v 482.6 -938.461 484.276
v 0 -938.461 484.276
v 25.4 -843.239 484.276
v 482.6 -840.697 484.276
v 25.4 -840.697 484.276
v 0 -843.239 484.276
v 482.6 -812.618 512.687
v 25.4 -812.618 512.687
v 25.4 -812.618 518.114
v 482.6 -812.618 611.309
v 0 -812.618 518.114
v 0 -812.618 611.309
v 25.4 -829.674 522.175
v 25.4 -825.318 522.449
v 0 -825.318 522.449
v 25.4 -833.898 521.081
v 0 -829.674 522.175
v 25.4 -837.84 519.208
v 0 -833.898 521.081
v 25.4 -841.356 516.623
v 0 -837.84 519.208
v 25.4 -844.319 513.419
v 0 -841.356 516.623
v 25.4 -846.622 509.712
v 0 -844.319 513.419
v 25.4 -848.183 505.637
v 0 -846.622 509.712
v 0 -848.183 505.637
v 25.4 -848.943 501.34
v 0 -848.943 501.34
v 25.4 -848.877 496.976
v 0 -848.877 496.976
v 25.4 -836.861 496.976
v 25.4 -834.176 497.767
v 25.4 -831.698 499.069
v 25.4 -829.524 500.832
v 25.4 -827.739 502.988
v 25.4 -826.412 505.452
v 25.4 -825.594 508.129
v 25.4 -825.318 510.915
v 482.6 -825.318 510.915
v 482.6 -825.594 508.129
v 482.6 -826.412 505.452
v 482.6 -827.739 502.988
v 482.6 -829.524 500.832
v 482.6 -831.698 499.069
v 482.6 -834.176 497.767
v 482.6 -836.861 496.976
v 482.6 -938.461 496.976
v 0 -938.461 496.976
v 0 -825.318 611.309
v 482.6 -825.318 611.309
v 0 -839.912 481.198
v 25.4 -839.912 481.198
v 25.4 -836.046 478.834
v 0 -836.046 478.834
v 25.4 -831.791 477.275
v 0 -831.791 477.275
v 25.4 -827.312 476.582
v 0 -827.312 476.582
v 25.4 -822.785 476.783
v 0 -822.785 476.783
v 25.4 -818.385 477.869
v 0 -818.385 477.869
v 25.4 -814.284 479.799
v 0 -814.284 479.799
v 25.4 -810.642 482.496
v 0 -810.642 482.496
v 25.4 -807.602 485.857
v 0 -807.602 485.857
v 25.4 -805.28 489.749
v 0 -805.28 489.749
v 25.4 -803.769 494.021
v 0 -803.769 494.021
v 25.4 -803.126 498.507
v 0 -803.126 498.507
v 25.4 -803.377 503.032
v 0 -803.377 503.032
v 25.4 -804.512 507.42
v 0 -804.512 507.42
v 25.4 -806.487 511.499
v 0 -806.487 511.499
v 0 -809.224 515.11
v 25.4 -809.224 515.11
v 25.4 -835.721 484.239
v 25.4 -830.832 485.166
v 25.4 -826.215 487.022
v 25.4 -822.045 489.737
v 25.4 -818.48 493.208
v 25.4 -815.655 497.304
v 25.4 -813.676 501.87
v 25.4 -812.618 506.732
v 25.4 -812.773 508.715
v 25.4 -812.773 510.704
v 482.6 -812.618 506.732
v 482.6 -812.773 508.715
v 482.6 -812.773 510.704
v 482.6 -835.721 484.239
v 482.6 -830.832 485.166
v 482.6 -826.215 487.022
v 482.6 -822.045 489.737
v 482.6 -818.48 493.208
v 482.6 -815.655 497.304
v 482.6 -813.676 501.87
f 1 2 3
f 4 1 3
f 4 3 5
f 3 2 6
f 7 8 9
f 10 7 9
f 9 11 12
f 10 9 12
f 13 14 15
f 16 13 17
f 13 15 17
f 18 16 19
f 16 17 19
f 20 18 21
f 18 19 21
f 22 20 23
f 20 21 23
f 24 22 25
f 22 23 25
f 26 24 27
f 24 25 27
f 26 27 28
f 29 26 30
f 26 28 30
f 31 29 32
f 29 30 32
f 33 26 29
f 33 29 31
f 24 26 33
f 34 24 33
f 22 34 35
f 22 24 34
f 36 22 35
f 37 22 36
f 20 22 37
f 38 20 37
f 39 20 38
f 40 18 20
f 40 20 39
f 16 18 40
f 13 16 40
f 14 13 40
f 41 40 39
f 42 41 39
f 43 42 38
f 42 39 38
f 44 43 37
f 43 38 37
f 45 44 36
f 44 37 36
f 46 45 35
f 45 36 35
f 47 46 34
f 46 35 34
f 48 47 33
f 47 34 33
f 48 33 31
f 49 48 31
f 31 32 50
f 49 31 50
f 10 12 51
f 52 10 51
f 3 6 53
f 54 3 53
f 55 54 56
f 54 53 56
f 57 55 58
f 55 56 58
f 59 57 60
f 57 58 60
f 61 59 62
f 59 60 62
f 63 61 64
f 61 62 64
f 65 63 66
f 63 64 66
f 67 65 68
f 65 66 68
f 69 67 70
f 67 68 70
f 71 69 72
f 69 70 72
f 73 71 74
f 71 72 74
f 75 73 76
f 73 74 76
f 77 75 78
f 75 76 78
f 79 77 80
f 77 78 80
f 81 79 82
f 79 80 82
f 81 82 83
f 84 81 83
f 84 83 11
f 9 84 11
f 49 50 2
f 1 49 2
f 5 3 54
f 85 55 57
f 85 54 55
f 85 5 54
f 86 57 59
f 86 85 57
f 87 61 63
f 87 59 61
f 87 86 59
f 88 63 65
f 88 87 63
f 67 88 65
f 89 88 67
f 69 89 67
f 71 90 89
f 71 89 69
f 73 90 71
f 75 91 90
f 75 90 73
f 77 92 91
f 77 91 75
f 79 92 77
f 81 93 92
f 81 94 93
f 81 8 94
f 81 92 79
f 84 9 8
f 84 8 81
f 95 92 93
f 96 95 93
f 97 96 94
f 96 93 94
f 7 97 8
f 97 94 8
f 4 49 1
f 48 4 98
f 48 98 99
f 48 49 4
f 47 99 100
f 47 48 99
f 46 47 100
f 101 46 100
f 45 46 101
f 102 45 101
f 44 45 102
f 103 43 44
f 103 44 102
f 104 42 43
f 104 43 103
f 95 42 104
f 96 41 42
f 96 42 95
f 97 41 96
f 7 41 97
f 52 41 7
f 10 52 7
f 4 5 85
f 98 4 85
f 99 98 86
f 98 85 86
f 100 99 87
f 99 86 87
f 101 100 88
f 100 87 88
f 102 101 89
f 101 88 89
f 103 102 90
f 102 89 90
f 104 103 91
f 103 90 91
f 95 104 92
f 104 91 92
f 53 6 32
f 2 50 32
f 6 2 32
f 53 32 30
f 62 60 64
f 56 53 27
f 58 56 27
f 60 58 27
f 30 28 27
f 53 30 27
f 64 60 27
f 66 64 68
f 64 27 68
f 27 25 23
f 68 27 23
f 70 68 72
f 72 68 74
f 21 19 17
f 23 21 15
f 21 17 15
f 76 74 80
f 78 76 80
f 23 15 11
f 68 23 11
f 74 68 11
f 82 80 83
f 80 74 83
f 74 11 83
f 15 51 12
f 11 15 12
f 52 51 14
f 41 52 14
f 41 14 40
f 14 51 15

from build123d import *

# Parameters (mm, degrees)
F1_DEPTH = 482.6
F2_R     = 22.9562722026
F3_DEPTH = 25.4


# Not quite as in the source:
# - a feature names something its author has since deleted; it is built from what else it names


with BuildPart() as f1:
    # F0 (on Right) → F1 (new body)
    with BuildSketch(Plane.YZ):
        with BuildLine():
            Line((-812.6182556152, 512.6869344869), (-812.6182556152, 611.3093582153))
            Line((-812.6182556152, 611.3093582153), (-825.3182556152, 611.3093582153))
            Line((-825.3182556152, 611.3093582153), (-825.3182556152, 510.914683342))
            ThreePointArc((-825.3182556152, 510.914683342), (-828.5785642638, 501.8659167533), (-836.8610188459, 496.9760562897))
            Line((-836.8610188459, 496.9760562897), (-938.4610188459, 496.9760562897))
            Line((-938.4610188459, 496.9760562897), (-938.4610188459, 484.2760562897))
            Line((-938.4610188459, 484.2760562897), (-840.6965225196, 484.2760562897))
            ThreePointArc((-840.6965225196, 484.2760562897), (-822.0453350188, 489.7370832304), (-812.6182556152, 506.7317819438))
            ThreePointArc((-812.6182556152, 506.7317819438), (-812.7921868823, 509.7093582153), (-812.6182556152, 512.6869344869))
        make_face()
    extrude(amount=F1_DEPTH)

    # F2 (on Right) → F3 (join)
    with BuildSketch(Plane.YZ):
        with Locations((-826.0604739189, 499.5044767857)):
            Circle(F2_R)
    extrude(amount=F3_DEPTH)


solid = f1.part
